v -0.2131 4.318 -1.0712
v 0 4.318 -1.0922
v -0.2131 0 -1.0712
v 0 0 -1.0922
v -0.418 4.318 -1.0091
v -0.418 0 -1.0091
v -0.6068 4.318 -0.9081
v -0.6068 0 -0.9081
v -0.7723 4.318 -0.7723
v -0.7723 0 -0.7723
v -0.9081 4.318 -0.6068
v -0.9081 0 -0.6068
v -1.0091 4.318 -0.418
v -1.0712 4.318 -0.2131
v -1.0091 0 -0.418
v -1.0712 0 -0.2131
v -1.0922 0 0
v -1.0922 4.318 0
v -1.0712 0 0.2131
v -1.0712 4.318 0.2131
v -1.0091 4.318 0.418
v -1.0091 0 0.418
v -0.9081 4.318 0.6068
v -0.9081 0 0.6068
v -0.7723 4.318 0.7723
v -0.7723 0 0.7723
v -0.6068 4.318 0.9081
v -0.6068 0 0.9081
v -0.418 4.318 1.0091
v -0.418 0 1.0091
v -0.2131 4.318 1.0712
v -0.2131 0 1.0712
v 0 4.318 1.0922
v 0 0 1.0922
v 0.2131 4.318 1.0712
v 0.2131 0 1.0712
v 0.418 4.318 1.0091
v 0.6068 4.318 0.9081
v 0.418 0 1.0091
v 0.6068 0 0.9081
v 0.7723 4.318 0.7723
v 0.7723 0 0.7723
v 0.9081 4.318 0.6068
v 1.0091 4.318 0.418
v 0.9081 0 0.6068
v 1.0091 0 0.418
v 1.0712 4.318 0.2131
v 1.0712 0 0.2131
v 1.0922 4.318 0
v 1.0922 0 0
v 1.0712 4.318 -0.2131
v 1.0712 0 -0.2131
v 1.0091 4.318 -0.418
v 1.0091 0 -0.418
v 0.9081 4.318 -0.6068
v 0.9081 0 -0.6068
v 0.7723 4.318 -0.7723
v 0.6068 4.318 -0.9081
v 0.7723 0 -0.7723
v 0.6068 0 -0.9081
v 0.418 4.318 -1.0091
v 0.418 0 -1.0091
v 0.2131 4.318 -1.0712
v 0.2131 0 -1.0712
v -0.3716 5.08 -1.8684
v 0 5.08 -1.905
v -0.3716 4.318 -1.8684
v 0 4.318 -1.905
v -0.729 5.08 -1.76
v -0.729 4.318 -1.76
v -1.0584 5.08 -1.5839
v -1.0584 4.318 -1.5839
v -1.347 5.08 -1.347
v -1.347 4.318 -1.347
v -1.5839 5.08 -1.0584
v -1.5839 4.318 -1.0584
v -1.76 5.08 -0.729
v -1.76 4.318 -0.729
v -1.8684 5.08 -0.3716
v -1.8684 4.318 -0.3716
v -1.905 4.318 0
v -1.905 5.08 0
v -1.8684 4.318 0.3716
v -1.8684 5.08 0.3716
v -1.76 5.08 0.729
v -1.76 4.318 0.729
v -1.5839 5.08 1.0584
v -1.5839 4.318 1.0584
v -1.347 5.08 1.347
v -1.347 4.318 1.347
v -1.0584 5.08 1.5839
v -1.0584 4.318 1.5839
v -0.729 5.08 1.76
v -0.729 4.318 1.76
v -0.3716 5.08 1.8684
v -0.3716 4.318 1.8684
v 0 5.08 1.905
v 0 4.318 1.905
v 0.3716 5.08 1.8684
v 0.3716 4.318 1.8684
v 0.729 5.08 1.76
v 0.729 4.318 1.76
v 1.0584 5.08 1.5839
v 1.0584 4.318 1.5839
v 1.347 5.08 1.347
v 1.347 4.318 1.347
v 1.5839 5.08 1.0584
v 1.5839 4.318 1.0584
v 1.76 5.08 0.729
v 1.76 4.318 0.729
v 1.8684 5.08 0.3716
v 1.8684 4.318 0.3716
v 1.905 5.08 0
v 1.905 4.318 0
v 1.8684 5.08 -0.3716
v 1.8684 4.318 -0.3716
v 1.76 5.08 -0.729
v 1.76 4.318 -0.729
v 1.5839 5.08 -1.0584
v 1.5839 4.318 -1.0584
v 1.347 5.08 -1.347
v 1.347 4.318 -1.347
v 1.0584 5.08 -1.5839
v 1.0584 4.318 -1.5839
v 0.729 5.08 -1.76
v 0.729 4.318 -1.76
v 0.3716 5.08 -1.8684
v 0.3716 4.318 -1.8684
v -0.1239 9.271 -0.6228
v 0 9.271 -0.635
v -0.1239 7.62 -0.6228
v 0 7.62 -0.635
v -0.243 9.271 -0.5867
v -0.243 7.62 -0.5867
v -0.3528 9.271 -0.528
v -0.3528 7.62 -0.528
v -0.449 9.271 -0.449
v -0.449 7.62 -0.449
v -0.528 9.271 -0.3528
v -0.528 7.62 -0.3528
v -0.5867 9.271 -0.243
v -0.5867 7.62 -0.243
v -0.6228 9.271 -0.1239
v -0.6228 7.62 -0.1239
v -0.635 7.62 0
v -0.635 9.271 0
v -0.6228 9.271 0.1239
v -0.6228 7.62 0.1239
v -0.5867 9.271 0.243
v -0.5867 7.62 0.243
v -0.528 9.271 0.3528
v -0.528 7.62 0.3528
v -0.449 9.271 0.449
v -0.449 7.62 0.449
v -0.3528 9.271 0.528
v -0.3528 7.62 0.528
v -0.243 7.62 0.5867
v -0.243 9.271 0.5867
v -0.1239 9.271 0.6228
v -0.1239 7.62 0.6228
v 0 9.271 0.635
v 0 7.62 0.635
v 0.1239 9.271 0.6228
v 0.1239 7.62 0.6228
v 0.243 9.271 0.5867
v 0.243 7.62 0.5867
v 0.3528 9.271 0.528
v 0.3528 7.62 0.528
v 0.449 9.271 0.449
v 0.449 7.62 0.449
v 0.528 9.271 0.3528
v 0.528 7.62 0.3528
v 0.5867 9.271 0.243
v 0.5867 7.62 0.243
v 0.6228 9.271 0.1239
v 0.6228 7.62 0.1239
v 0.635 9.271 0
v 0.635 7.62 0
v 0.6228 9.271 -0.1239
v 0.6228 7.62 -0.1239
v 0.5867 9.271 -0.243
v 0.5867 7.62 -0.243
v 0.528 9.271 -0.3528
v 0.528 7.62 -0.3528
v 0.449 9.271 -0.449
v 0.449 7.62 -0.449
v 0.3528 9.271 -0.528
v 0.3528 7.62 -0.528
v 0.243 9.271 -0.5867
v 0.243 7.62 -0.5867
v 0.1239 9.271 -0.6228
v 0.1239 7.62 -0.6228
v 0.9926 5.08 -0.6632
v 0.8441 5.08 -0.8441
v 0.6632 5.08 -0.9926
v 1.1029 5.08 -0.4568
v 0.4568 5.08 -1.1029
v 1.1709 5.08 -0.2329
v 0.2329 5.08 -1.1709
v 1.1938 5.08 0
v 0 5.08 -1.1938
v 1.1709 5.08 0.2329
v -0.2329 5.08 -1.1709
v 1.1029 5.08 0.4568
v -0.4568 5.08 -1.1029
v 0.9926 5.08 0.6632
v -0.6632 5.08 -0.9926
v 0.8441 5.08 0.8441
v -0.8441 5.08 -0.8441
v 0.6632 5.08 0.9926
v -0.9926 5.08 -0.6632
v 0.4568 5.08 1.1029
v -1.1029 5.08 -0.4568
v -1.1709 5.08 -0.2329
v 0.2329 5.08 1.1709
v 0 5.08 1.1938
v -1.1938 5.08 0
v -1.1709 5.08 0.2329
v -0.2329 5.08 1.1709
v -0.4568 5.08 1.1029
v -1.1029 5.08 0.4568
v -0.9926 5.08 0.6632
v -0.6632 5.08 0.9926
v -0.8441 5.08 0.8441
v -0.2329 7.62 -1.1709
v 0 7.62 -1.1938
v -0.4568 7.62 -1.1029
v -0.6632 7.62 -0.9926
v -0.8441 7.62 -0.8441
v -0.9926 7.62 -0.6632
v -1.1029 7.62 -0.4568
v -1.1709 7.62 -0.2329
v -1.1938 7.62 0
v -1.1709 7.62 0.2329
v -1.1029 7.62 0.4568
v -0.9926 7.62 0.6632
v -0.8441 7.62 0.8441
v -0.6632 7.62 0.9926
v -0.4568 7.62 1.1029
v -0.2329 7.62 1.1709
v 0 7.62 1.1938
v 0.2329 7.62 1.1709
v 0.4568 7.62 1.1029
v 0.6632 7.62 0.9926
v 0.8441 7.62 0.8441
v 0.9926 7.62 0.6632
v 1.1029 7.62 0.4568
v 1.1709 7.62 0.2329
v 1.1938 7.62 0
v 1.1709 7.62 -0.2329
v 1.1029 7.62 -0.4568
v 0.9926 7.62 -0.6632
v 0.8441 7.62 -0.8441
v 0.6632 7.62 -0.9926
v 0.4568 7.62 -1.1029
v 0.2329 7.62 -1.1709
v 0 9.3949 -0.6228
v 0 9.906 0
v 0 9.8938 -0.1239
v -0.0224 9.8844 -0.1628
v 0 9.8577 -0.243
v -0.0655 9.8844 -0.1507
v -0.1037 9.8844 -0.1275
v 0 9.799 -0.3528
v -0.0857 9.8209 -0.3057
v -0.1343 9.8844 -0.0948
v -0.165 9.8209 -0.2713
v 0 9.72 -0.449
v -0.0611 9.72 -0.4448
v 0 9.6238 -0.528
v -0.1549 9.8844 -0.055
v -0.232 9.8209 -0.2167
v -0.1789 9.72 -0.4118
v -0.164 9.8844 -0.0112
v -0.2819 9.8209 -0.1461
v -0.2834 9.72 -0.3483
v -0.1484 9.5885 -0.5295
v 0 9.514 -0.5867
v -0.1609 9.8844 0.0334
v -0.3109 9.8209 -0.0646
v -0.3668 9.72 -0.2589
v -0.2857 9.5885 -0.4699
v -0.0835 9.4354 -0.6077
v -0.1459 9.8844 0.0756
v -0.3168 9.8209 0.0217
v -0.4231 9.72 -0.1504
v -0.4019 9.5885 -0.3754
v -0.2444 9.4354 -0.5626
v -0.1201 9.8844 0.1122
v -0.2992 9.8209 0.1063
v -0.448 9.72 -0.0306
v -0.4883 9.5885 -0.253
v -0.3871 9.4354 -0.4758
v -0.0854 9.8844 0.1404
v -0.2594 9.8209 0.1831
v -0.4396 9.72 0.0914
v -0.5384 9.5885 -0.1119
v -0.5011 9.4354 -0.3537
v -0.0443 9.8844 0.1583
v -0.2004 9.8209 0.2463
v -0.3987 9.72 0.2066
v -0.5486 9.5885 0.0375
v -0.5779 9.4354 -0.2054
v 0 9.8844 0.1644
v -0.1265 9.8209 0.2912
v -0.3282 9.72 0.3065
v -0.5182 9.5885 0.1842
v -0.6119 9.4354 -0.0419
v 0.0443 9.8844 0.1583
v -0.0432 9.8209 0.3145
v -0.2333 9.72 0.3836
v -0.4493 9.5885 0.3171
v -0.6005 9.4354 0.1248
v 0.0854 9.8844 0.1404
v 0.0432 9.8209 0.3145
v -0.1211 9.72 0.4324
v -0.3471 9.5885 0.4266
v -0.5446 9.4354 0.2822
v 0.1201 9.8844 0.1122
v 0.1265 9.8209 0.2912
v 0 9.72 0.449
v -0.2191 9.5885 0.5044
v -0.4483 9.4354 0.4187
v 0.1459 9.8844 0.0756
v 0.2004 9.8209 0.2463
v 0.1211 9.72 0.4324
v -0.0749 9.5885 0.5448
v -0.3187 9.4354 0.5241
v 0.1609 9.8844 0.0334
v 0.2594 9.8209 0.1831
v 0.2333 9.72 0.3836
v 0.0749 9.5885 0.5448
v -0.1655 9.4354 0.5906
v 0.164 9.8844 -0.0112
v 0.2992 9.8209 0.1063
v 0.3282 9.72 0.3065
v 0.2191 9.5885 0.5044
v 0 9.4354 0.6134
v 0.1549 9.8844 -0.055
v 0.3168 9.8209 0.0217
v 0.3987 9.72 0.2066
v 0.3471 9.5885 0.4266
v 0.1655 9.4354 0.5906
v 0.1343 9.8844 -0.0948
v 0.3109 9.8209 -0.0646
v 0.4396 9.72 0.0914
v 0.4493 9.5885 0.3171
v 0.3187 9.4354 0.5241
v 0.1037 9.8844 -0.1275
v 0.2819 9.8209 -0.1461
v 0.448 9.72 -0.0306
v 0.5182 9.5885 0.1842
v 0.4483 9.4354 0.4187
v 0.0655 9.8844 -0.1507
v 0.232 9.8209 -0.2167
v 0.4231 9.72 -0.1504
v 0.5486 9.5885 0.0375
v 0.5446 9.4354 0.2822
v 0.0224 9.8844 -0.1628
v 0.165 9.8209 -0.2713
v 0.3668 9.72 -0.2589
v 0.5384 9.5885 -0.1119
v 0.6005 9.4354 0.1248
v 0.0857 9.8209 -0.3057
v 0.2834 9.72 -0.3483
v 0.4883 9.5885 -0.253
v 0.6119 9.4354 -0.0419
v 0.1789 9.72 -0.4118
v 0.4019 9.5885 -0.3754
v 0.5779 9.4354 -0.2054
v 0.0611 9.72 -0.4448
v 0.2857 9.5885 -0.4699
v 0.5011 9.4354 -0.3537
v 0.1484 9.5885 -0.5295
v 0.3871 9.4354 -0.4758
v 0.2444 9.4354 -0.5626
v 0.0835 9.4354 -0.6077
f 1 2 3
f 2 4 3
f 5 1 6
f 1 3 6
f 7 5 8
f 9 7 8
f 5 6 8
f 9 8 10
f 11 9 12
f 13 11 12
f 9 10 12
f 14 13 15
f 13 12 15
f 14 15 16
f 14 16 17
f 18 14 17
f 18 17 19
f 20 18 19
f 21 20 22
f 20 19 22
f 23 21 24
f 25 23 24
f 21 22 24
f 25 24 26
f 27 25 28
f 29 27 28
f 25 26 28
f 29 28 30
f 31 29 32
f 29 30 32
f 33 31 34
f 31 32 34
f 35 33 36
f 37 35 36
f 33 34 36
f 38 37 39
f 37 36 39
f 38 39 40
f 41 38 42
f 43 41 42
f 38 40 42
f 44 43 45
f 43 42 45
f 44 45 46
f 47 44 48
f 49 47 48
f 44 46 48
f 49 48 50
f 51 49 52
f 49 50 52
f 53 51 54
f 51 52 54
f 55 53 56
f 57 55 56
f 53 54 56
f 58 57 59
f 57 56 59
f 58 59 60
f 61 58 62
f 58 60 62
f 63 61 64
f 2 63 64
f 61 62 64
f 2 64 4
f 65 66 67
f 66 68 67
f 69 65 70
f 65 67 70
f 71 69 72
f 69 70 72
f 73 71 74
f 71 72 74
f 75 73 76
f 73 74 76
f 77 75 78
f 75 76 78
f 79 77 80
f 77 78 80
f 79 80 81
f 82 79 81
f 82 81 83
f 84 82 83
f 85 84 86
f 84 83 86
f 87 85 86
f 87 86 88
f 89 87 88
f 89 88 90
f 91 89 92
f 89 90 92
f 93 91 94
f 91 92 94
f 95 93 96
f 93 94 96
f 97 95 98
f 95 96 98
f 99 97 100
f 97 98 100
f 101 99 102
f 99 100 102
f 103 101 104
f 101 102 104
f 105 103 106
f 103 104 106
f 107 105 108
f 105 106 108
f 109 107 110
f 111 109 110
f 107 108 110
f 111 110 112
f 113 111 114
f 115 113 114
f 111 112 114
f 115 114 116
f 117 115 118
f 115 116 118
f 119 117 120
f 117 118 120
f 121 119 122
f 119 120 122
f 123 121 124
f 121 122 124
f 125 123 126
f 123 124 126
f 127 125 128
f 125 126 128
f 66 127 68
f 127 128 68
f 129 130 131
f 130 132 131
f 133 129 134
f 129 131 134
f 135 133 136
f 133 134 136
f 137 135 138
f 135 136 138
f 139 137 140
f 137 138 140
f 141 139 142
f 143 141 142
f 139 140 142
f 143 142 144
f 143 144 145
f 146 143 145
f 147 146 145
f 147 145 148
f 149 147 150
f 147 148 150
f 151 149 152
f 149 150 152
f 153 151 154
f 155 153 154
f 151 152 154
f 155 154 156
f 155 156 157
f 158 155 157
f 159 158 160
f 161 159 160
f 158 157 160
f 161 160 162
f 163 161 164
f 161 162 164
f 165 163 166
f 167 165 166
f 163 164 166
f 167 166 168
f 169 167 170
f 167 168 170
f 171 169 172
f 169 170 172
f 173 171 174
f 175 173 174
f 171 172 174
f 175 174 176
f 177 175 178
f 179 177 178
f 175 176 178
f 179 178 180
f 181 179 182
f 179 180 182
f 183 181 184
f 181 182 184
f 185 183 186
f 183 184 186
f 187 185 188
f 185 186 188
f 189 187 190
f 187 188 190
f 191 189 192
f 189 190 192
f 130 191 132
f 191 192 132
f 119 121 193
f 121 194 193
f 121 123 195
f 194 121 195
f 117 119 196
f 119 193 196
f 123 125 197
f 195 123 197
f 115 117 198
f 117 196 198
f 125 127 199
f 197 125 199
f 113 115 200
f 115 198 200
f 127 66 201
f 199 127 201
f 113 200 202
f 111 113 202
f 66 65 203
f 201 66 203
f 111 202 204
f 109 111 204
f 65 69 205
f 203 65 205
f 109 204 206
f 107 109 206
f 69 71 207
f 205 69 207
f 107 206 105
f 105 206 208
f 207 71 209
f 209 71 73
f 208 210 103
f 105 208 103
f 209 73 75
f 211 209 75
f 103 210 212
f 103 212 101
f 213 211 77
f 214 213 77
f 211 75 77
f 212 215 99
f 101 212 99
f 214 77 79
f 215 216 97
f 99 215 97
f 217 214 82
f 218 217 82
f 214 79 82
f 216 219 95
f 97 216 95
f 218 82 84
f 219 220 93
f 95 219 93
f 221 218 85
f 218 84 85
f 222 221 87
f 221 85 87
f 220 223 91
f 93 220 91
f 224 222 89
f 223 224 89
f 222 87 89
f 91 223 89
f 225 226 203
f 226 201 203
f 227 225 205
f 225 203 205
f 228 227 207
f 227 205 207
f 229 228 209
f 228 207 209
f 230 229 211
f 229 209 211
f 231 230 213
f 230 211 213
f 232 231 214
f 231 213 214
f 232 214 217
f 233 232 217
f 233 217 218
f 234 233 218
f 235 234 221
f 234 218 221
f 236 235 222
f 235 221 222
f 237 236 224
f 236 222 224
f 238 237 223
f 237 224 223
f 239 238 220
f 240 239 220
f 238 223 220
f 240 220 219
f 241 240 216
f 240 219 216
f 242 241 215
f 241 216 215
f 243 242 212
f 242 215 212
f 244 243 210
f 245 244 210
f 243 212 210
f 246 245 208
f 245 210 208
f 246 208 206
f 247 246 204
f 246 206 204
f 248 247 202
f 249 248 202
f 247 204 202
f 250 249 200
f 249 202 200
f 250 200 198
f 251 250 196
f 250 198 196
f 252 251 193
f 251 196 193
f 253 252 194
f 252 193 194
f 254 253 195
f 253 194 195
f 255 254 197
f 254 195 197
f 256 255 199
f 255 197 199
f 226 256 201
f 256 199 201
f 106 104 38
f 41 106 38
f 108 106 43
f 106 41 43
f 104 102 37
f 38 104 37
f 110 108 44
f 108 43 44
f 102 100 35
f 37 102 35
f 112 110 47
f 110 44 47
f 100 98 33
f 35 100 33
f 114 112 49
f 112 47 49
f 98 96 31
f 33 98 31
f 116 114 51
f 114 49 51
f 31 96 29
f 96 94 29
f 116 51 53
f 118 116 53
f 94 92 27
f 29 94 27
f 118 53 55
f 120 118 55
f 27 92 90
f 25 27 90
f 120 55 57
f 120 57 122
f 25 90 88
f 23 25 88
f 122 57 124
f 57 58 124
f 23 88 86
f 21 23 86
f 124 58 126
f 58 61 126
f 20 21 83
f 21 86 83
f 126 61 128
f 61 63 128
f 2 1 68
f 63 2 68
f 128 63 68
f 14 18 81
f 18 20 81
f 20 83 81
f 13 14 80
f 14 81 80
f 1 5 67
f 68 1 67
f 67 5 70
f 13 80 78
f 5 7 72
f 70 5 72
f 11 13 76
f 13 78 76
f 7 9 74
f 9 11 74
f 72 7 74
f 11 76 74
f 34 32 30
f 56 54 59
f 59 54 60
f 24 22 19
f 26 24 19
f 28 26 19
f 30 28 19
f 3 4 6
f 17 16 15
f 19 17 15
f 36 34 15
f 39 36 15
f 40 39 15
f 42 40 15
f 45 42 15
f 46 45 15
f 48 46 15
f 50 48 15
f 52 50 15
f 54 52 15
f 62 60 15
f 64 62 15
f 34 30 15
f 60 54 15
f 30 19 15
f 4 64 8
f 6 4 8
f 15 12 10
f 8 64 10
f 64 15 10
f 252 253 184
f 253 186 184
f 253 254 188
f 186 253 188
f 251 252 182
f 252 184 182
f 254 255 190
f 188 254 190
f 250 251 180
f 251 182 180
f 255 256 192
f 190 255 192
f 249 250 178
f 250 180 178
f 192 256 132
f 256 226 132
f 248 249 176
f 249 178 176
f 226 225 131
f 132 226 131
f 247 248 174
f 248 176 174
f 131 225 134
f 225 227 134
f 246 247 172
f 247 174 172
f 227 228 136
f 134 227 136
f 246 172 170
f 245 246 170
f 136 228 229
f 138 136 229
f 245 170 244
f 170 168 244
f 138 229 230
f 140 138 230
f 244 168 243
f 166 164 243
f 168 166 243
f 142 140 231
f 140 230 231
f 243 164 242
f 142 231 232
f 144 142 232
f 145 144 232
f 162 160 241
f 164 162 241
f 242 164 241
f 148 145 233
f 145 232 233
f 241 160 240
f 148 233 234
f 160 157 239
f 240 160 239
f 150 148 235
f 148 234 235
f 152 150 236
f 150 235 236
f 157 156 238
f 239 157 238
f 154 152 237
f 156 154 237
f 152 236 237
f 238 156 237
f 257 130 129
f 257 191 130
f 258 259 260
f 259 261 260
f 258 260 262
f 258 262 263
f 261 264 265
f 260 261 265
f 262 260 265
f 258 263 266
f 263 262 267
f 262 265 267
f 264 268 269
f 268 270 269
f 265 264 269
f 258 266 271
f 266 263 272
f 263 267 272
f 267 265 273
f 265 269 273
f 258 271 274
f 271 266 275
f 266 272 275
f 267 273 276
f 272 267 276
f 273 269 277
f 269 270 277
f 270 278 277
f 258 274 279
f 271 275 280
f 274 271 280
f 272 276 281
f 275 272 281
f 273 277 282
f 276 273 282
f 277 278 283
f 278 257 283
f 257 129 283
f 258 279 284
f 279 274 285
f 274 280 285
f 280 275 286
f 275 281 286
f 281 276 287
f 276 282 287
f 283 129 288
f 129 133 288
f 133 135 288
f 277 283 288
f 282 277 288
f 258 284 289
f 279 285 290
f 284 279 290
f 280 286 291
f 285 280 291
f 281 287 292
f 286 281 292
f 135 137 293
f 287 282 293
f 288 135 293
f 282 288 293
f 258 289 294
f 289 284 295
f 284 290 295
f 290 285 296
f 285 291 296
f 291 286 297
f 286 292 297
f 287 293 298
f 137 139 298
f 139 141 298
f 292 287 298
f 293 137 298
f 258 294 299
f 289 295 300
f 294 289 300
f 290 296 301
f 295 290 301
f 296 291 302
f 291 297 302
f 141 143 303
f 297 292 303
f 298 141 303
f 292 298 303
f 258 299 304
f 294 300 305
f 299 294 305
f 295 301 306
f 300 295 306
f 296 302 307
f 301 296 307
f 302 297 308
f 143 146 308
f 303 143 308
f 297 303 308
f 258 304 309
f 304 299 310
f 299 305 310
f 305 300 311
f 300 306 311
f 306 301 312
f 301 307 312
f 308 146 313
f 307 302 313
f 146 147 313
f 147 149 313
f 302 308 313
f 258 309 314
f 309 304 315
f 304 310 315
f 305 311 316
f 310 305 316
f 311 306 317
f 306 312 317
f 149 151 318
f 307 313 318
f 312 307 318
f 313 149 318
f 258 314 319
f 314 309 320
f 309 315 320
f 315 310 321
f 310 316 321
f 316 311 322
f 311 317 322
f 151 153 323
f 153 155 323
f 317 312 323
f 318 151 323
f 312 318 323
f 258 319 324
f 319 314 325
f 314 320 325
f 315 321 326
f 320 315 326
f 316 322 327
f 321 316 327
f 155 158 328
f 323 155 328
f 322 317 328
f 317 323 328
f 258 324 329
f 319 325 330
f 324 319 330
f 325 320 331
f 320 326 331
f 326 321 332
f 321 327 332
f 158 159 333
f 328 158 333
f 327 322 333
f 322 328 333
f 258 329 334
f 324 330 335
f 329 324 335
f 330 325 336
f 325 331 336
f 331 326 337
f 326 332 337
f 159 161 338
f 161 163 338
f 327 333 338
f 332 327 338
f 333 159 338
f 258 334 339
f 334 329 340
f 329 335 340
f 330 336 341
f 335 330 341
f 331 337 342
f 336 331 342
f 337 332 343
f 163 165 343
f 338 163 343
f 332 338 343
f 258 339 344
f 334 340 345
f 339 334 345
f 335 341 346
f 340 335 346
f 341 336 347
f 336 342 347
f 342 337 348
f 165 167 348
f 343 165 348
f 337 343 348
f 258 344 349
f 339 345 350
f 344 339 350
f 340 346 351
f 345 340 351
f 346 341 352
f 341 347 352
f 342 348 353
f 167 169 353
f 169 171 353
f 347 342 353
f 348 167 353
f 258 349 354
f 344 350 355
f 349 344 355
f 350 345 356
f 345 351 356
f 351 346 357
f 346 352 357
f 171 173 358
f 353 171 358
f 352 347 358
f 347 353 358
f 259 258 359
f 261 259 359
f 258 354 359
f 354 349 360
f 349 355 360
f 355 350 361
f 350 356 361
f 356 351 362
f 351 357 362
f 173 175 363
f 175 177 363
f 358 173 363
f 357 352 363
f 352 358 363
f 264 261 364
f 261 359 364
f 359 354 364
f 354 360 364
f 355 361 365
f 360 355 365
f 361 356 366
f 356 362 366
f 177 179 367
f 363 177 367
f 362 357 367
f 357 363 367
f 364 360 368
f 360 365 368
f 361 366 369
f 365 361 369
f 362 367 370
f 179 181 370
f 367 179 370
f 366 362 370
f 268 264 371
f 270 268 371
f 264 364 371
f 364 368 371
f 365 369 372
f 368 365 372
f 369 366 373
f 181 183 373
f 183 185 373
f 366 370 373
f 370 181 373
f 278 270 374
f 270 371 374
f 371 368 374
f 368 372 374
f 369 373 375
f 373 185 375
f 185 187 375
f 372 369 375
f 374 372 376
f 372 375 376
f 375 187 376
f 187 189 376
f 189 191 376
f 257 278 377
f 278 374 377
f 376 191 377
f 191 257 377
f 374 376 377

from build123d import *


with BuildPart() as part:
    # Sketch1 → Revolve1 (revolve)
    with BuildSketch(Plane(origin=(0, 0, 0), x_dir=(0, 0, -1), z_dir=(1, 0, 0))):
        with BuildLine():
            Line((0.635, 7.62), (1.1938, 7.62))
            Line((1.1938, 7.62), (1.1938, 5.08))
            Line((1.1938, 5.08), (1.905, 5.08))
            Line((1.905, 5.08), (1.905, 4.318))
            Line((1.905, 4.318), (1.0922, 4.318))
            Line((1.0922, 4.318), (1.0922, 0))
            Line((1.0922, 0), (0, 0))
            Line((0, 0), (0, 9.906))
            ThreePointArc((0, 9.906), (0.449012806, 9.720012806), (0.635, 9.271))
            Line((0.635, 9.271), (0.635, 7.62))
        make_face()
    revolve(axis=Axis((0, 0, 0), (0, 1, 0)))


solid = part.part
